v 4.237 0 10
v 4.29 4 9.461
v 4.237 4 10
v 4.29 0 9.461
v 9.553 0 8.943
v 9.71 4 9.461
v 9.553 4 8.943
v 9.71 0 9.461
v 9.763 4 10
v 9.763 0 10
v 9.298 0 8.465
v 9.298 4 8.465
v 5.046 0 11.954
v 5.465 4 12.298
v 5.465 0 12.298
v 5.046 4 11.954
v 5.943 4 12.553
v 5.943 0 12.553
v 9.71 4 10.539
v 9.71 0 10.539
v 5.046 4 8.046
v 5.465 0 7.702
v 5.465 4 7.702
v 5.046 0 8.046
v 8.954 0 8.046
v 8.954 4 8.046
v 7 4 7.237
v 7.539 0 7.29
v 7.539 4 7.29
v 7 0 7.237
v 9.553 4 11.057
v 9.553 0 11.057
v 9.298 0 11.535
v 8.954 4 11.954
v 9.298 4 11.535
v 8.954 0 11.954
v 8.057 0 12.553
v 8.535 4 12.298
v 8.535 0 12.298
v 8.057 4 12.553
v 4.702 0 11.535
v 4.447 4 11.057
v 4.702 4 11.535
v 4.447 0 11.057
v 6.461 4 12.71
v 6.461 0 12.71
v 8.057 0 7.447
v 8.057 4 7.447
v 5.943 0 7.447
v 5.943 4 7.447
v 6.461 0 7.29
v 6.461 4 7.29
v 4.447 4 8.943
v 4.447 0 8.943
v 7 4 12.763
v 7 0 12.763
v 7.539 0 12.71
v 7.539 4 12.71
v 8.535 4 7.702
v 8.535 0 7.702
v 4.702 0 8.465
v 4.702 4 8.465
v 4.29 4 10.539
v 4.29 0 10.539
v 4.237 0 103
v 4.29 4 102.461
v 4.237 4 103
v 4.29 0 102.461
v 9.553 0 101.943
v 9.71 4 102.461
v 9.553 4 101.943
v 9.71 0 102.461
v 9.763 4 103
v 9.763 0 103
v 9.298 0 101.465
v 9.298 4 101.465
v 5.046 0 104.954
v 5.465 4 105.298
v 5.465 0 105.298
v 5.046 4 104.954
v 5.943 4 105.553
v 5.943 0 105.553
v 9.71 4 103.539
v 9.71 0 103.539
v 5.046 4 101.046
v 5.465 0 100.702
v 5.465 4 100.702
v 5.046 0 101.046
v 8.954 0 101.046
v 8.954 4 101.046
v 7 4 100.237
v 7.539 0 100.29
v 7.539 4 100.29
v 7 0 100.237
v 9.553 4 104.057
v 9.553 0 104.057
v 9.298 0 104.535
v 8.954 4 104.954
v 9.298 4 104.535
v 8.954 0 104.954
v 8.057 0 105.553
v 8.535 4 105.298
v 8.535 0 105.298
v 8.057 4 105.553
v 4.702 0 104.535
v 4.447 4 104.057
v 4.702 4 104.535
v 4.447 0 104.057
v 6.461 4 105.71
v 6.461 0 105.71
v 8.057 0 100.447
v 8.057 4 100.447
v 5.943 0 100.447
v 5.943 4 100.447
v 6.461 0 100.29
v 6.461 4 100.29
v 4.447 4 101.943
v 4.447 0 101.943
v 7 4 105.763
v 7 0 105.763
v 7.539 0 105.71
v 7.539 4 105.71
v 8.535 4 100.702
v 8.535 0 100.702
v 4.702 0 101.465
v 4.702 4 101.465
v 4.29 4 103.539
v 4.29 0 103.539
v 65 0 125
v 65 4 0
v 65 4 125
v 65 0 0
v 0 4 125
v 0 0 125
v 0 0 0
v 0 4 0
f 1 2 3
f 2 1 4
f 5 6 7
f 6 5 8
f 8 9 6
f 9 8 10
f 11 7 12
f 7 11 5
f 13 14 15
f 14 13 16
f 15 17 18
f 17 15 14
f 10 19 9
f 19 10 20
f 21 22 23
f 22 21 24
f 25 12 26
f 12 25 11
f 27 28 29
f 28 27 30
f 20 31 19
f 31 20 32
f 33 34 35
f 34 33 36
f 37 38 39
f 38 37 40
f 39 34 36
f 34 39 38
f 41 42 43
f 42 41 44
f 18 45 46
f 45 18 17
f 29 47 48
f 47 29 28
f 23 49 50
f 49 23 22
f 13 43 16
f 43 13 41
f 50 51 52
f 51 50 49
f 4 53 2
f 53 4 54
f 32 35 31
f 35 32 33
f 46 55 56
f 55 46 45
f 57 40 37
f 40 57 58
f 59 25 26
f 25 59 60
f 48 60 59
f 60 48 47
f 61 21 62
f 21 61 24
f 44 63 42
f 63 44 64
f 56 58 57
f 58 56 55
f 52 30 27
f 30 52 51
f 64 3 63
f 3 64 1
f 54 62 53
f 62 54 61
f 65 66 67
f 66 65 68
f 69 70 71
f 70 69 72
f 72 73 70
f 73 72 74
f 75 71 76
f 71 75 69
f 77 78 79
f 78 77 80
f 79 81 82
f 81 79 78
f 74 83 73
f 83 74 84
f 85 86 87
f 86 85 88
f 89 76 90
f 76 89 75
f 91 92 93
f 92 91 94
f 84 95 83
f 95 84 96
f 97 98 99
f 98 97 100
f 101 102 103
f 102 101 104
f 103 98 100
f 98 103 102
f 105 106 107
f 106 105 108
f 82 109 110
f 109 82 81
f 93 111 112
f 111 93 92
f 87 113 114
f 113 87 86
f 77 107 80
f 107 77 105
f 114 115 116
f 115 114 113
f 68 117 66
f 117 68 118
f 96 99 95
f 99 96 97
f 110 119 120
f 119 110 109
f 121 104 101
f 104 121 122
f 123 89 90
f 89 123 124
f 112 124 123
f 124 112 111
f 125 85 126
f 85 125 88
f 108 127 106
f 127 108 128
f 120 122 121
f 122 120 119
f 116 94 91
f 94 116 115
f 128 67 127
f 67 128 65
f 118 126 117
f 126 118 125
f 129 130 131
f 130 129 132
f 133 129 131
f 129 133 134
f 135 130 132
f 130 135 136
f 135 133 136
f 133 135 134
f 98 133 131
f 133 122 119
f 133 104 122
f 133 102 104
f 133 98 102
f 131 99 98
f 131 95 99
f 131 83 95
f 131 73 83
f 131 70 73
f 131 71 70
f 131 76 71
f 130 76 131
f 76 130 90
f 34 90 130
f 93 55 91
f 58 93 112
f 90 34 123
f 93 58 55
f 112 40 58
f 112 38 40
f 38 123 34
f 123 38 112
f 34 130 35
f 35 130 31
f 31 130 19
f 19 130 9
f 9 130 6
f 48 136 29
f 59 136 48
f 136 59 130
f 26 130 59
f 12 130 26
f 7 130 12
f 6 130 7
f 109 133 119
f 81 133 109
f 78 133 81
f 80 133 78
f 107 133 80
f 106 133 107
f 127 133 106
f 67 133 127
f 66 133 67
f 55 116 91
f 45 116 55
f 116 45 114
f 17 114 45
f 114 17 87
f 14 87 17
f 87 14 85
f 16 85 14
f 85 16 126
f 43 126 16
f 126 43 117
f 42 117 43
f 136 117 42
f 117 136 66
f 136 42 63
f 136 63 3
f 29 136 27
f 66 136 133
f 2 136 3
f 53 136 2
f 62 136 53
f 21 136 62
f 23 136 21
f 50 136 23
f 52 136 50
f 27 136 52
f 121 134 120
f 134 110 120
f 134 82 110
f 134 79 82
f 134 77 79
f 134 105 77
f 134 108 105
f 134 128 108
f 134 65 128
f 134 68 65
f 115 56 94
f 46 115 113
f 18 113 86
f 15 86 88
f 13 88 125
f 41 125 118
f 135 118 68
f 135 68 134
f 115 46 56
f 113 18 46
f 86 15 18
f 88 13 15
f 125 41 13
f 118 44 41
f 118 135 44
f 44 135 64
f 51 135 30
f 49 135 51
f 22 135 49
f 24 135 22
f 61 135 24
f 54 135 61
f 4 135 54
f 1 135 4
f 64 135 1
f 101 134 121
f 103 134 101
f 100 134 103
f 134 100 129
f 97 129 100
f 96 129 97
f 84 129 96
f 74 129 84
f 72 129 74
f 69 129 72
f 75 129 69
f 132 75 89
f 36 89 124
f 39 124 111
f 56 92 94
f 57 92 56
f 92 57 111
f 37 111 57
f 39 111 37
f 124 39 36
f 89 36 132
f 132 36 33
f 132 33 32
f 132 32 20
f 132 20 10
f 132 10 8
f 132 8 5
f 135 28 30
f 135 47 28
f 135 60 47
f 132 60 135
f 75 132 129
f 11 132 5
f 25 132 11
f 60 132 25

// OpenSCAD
// file: ../../../../../scad/lib/parent_spar_bolted.scad
// Parent modular exterior v2. mm. Geometry shared by individual part wrappers.
// Metal fasteners, ballast, Takachi box and electronics are purchased items.
/* [Dimensions] */
disk_d=225; disk_t=5;
fin_h=125; fin_w=65; fin_t=4;
beam_w=32; clearance=0.5;
float_r=100; flange_r=112.5; float_bore_r=30;
float_wall=4; float_h=180; lid_t=6;
rod_r=105.5; flange_t=6;
hub_h=32; root_x=30; root_depth=14;
$fn=96; e=0.03;
assert(disk_d<=225 && 2*flange_r<=225);
assert(fin_h>=100 && fin_h<=150 && fin_w>=50 && fin_w<=80);
assert(root_x+fin_w<disk_d/2-5);
module bore(d,h) { cylinder(d=d/cos(180/32),h=h,$fn=32); }
module bore_x(d,l) { rotate([0,90,0]) bore(d,l); }
module bore_y(d,l) { rotate([-90,0,0]) bore(d,l); }
module square_bore(h) { translate([-(beam_w+clearance)/2,-(beam_w+clearance)/2,-e]) cube([beam_w+clearance,beam_w+clearance,h+2*e]); }
module rods(h,d=6.5) { for(a=[45:90:315]) rotate([0,0,a]) translate([rod_r,0,-e]) bore(d,h+2*e); }
module lid_bolts(h) { for(a=[22.5:45:359]) rotate([0,0,a]) translate([rod_r,0,-e]) bore(4.5,h+2*e); }
module hub_pin(z) { translate([-46,10,z]) bore_x(6.5,92); }
module disk() {
 difference() { cylinder(d=disk_d,h=disk_t); square_bore(disk_t);
  for(x=[-23,23],y=[-23,23]) translate([x,y,-e]) bore(5.5,disk_t+2*e);
 }
}
module fin() {
 difference() { cube([fin_w,fin_t,fin_h]);
  for(z=[10,fin_h-hub_h+10]) translate([root_depth/2,-e,z]) bore_y(5.5,fin_t+2*e);
 }
}
module hub() {
 difference() {
  union() { translate([-30,-30,0]) cube([60,60,hub_h]);
   for(a=[0:90:270]) rotate([0,0,a]) translate([28,-16,0]) cube([16,32,hub_h]);
  }
  square_bore(hub_h);
  for(a=[0:90:270]) rotate([0,0,a]) {
   translate([root_x-clearance/2,-(fin_t+clearance)/2,-e]) cube([root_depth+clearance,fin_t+clearance,hub_h+2*e]);
   translate([root_x+root_depth/2,-17,10]) bore_y(5.5,34);
  }
  for(x=[-23,23],y=[-23,23]) translate([x,y,-e]) bore(5.5,hub_h+2*e);
  hub_pin(24);
 }
}
module beam(lower=true) {
 len=lower?180:107;
 difference() { translate([-beam_w/2,-beam_w/2,0]) cube([beam_w,beam_w,len]);
  if(lower) { for(z=[24,117]) hub_pin(z); translate([-20,0,160]) bore_x(6.5,40); translate([0,0,-e]) bore(16,8); }
  else for(z=[20,87]) translate([-20,0,z]) bore_x(6.5,40);
 }
}
module coupler() {
 // One half of a screwed split coupler. Mirror Y for the second half.
 difference() { translate([-27,0.25,0]) cube([54,26.75,64]); square_bore(64);
  for(z=[12,52]) translate([-28,0,z]) bore_x(6.5,56);
  for(x=[-22,22],z=[24,40]) translate([x,-1,z]) bore_y(5.5,29);
 }
}
module float_body() {
 difference() {
  union() { cylinder(r=float_r,h=float_h);
   translate([0,0,float_h-flange_t]) cylinder(r=flange_r,h=flange_t);
   // 45-degree underside of the flange instead of a 15 mm unsupported ledge.
   translate([0,0,float_h-flange_t-(flange_r-float_r)]) cylinder(r1=float_r,r2=flange_r,h=flange_r-float_r);
  }
  translate([0,0,-e]) cylinder(r=float_bore_r,h=float_h+2*e);
  translate([0,0,float_wall]) difference() {
   cylinder(r=float_r-float_wall,h=float_h);
   cylinder(r=float_bore_r+float_wall,h=float_h+e);
  }
  // Coupling-nut clearance; nearest cavity wall remains >=3 mm thick.
  rods(float_h,13); lid_bolts(float_h);
  for(a=[22.5:45:359]) rotate([0,0,a]) translate([rod_r,0,-e]) bore(10,float_h-flange_t+e);
 }
}
module float_lid() {
 difference() {
  cylinder(r=flange_r,h=lid_t);
  translate([0,0,-e]) cylinder(r=float_bore_r,h=lid_t+2*e);
  rods(lid_t,13); lid_bolts(lid_t);
  // Continuous face seals: 2 mm cord, 2.4 wide x 1.5 deep grooves.
  for(r=[float_bore_r+float_wall/2,float_r-float_wall/2]) translate([0,0,-e]) difference() {
   cylinder(r=r+1.2,h=1.5+e); cylinder(r=r-1.2,h=1.5+2*e);
  }
 }
}
module float_end(top=true) {
 difference() {
  union() { cylinder(r=flange_r,h=8);
   if(top) translate([-30,-30,8-e]) cube([60,60,20+e]);
   else translate([-23,-23,-40]) cube([46,46,40+e]);
  }
  rods(8);
  if(top) for(x=[-20,20],y=[-20,20]) {
   translate([x,y,-e]) bore(5.5,29);
   translate([x,y,-e]) bore(11,18+e);
  }
  if(top) for(a=[22.5:45:359]) rotate([0,0,a]) translate([rod_r,0,-e]) bore(12,8+2*e);
  else { translate([0,0,-40]) square_bore(40-e);
   translate([-24,0,-20]) bore_x(6.5,48);
  }
 }
}
module ballast_body() {
 // Open upward in print orientation. In the assembly this cup is inverted.
 difference() {
  union() { cylinder(r=45,h=51); translate([0,0,45]) cylinder(r=60,h=6);
   translate([0,0,30]) cylinder(r1=45,r2=60,h=15);
  }
  translate([0,0,6]) cylinder(r=40,h=46);
  for(x=[-23,23],y=[-23,23]) translate([x,y,-e]) bore(5.5,7);
  translate([0,0,-e]) bore(8.5,7);
  for(a=[0:90:270]) rotate([0,0,a]) translate([52,0,29]) { bore(5.5,23); bore(12,16); }
 }
}
module ballast_lid() {
 difference() { cylinder(r=60,h=6);
  for(a=[0:90:270]) rotate([0,0,a]) translate([52,0,-e]) bore(5.5,7);
  // Flooded ballast compartment: drainage, no trapped air assumption.
  for(x=[-20,0,20]) translate([x,0,-e]) bore(6,7);
 }
}
module camera_bridge() {
 // Assembly frame: local top z=78; camera seat z=8. +Y faces camera front.
 difference() {
  union() {
   translate([-30,45,70]) cube([60,90,8]);
   translate([-70,125,0]) cube([140,100,8]);
   translate([-70,125,0]) cube([140,10,78]);
   for(x=[-64,56]) translate([x,0,0]) rotate([90,0,90]) linear_extrude(8)
    polygon([[135,8],[215,8],[135,70]]);
  }
  for(x=[-20,20],y=[50,90]) translate([x,y,69]) bore(5.5,10);
  for(x=[-11,11],y=[174,206]) translate([x,y,-e]) bore(5.5,10);
 }
}
module gps_bridge() {
 // Local attachment face X=0 at deck +X; top shelf z=175.
 difference() {
  union() { translate([0,-25,0]) cube([10,50,183]);
   translate([-90,-48,175]) cube([100,96,8]);
   for(y=[-17,25]) translate([0,y,0]) rotate([90,0,0]) linear_extrude(8)
    polygon([[e,155],[e,175+e],[-80,175+e]]);
  }
  for(y=[-20,20],z=[5,45]) translate([-e,y,z]) bore_x(5.5,11);
  for(y=[-34,34]) translate([-43,y,174]) bore(4.5,10);
 }
}
// Reference antenna envelope, correct mounting ears, not a printable antenna.
module gps_reference() {
 difference() {
  union() { translate([-30,-28,0]) cube([60,56,22.5]);
   translate([-10,-41,0]) cube([20,82,6]); }
  for(y=[-34,34]) translate([0,y,-e]) bore(4.5,7);
 }
}
// main file
// mm. part=print is the intended X1C orientation.
part="assembly"; // [assembly,print]
use <../../../../../scad/lib/parent_spar_bolted.scad>
if(part=="print") { translate([0,125,0]) rotate([90,0,0]) fin(); } else { fin(); }
